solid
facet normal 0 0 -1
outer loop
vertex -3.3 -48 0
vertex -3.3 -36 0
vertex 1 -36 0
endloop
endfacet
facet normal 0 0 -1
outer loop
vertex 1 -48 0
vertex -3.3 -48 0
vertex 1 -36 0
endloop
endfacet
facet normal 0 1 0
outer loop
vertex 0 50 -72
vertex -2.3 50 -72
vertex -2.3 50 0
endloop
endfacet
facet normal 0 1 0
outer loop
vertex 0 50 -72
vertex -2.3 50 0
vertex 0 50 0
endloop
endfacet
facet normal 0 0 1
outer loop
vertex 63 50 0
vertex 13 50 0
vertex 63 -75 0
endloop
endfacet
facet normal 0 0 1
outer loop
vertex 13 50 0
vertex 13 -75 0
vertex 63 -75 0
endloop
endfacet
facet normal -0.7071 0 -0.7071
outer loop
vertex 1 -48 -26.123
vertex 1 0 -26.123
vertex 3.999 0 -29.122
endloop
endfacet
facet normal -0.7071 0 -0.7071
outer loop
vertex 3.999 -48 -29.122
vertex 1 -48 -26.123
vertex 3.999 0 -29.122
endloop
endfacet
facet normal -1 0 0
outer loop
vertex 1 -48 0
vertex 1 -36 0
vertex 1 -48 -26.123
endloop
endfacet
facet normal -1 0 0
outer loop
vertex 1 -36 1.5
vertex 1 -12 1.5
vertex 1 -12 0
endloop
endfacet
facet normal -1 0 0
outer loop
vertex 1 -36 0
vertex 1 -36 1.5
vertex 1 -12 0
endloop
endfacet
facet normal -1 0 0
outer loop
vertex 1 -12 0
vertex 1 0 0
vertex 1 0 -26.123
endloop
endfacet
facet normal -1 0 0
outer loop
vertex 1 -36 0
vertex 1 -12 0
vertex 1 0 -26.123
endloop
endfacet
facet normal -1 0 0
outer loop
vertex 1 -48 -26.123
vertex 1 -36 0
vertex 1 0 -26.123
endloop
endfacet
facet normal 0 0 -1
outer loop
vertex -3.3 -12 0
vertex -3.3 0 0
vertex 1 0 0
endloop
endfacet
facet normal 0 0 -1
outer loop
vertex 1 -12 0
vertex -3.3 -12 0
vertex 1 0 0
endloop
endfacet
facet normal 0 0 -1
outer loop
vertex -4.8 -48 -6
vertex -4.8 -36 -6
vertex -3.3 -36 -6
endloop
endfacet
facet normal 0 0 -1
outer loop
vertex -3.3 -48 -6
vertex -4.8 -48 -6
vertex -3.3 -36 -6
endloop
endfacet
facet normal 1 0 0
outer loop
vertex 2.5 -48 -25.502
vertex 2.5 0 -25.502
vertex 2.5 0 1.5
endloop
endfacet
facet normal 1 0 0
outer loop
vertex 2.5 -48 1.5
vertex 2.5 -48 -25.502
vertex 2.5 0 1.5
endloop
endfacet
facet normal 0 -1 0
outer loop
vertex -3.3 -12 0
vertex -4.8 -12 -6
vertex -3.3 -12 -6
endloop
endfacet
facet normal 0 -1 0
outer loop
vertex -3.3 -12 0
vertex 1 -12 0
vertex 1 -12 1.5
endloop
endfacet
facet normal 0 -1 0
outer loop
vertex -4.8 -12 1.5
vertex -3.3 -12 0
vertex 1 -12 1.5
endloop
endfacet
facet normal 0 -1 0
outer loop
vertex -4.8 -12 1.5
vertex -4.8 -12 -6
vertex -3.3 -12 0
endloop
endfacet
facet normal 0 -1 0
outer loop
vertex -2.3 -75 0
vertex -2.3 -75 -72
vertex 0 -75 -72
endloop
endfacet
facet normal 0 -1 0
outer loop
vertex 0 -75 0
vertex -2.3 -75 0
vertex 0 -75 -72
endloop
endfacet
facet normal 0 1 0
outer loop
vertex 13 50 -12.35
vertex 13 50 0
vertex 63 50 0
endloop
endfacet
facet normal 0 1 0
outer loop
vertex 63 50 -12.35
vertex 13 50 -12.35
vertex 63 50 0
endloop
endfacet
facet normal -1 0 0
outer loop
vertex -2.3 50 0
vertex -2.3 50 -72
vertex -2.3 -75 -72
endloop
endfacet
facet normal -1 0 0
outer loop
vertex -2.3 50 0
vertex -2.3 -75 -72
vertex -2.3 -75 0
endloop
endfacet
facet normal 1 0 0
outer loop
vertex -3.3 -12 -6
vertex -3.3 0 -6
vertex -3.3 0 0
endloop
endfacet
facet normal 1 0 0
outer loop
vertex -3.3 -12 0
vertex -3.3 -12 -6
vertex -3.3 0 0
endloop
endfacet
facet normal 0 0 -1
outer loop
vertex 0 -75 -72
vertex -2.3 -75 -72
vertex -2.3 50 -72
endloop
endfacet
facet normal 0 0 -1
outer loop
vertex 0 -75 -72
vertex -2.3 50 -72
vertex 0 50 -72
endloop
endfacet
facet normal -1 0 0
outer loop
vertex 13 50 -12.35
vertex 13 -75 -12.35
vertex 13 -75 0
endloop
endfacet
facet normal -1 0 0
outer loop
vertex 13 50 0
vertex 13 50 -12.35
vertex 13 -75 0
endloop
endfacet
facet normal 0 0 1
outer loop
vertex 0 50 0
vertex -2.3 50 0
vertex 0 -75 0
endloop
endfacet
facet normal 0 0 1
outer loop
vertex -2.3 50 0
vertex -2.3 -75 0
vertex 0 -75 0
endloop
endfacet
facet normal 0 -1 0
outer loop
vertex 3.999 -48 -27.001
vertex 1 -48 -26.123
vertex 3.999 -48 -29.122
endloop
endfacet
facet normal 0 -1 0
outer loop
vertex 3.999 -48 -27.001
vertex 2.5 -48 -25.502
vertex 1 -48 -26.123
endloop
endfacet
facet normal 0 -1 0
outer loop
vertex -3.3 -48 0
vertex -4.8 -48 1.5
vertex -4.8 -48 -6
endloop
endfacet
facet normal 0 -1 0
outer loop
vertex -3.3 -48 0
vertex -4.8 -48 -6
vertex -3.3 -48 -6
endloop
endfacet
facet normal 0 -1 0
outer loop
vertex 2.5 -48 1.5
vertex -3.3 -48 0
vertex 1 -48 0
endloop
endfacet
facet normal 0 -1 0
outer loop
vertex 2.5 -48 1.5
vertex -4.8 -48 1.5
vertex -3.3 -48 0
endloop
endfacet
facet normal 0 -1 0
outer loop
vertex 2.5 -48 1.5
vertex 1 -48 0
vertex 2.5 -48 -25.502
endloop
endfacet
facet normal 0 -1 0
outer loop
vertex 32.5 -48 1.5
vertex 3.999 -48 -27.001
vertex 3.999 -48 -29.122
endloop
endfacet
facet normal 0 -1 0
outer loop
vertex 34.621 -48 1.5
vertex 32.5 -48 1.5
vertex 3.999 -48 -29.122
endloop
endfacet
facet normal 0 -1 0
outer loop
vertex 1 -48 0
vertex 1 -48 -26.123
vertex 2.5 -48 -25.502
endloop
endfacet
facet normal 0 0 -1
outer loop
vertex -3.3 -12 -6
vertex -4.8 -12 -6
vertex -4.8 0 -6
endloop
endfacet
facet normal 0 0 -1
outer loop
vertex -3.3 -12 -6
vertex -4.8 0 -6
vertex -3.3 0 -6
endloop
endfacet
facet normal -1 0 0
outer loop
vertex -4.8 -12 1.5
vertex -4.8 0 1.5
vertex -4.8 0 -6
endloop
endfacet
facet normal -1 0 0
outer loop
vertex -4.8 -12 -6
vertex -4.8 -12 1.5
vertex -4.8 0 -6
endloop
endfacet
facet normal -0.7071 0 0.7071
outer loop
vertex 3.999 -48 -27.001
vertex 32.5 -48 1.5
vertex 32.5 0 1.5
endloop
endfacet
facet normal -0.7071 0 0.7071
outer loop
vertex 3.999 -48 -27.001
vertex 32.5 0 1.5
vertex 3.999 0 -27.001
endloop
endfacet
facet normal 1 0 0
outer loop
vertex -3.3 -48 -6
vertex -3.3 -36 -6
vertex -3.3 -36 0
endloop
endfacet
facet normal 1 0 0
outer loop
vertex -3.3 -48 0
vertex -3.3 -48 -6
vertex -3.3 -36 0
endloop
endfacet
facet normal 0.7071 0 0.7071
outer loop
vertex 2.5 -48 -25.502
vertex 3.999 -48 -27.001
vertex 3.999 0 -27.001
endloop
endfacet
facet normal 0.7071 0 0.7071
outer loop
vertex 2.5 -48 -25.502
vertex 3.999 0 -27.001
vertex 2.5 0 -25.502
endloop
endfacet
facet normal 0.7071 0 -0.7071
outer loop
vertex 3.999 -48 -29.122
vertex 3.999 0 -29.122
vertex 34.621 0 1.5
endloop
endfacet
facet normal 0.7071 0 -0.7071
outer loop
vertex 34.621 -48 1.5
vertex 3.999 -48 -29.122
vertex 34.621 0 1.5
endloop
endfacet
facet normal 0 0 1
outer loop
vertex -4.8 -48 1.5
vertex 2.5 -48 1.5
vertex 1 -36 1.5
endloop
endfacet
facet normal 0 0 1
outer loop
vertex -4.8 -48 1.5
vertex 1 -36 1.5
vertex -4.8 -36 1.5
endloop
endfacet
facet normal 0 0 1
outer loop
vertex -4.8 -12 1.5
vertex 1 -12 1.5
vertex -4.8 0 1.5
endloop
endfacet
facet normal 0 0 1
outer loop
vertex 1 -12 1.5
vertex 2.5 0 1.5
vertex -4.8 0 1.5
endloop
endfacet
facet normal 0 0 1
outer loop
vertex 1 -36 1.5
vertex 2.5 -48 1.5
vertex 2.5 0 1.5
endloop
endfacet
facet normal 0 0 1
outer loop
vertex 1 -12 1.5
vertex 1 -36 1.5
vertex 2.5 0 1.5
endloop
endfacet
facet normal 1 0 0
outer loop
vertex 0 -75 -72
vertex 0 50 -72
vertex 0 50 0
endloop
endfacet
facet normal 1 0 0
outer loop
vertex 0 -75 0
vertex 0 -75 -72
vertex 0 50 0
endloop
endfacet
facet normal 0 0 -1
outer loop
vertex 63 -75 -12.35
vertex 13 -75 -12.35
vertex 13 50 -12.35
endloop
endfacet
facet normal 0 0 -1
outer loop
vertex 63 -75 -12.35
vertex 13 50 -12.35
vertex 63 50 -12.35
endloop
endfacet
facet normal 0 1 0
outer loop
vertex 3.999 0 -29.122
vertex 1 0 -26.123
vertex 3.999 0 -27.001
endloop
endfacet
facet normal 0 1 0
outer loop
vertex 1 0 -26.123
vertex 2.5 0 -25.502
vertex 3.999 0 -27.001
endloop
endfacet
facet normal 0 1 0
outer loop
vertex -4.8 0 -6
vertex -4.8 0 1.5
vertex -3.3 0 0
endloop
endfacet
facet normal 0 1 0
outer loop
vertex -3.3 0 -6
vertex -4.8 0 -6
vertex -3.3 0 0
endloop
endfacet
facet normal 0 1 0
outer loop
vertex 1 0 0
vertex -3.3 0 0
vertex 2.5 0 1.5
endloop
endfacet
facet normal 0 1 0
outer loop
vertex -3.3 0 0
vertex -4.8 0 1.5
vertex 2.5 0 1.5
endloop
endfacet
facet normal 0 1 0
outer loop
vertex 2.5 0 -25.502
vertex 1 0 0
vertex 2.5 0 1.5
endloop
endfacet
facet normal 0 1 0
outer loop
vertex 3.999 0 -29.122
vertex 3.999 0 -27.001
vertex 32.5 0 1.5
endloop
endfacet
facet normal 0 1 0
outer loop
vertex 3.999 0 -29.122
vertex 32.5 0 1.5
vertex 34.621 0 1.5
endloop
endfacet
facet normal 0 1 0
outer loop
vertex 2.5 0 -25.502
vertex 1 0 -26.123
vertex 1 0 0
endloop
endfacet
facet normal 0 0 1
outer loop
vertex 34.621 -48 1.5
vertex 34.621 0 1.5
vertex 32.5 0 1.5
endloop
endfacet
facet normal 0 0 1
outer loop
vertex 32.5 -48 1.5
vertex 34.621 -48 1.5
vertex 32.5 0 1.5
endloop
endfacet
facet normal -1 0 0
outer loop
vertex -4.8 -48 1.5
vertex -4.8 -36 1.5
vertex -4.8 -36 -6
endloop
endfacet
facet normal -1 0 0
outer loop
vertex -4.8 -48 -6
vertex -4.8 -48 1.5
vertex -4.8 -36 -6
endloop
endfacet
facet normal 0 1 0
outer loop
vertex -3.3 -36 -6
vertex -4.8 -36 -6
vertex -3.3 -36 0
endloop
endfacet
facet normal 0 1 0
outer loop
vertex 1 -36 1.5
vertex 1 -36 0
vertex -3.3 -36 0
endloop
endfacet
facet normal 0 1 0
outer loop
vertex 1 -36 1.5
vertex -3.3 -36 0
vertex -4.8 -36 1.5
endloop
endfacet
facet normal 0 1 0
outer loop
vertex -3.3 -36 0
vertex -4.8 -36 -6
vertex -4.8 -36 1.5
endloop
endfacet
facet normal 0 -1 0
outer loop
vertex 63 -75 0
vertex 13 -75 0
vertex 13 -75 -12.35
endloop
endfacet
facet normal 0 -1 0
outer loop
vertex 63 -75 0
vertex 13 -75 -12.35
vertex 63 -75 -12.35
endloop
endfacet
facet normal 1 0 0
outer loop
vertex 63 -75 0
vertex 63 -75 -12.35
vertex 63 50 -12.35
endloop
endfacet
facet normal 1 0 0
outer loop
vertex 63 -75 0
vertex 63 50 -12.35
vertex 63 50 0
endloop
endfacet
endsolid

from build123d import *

# Parameters (mm, degrees)
F1_W          = 2.3
F1_H          = 72
F2_DEPTH      = 75
F2_DEPTH_BACK = 50
F3_W          = 50
F3_H          = 12.35
F4_DEPTH      = 75
F4_DEPTH_BACK = 50
F6_DEPTH      = 48
F7_W          = 24
F7_H          = 7.5
F8_DEPTH      = 5.8


with BuildPart() as f2:
    # F1 (on Front) → F2 (new body, two sides)
    with BuildSketch(Plane.XZ) as f2_sk:
        with Locations((-1.15, -36)):
            Rectangle(F1_W, F1_H)
    extrude(amount=F2_DEPTH)
    extrude(f2_sk.sketch, amount=-F2_DEPTH_BACK)


with BuildPart() as f4:
    # F3 (on Front) → F4 (new body, two sides)
    with BuildSketch(Plane.XZ) as f4_sk:
        with Locations((38, -6.175)):
            Rectangle(F3_W, F3_H)
    extrude(amount=F4_DEPTH)
    extrude(f4_sk.sketch, amount=-F4_DEPTH_BACK)


with BuildPart() as f6:
    # F5 (on Front) → F6 (new body)
    with BuildSketch(Plane.XZ):
        Polygon((-4.8, 1.5), (-4.8, -6), (-3.3, -6), (-3.3, 0), (1, 0), (1, -26.1228512973), (3.9992345232, -29.1220858204), (34.6213203436, 1.5), (32.5, 1.5), (3.9992345232, -27.0007654768), (2.5, -25.5015309537), (2.5, 1.5), align=None)
    extrude(amount=F6_DEPTH)

    # F7 (on face) → F8 (cut, through all)
    with BuildSketch(Plane(origin=(-4.8, 0, 0), x_dir=(0, -1, 0), z_dir=(-1, 0, 0))):
        with Locations((24, -2.25)):
            Rectangle(F7_W, F7_H)
    extrude(amount=-F8_DEPTH, mode=Mode.SUBTRACT)


solid = Compound([f2.part, f4.part, f6.part])
